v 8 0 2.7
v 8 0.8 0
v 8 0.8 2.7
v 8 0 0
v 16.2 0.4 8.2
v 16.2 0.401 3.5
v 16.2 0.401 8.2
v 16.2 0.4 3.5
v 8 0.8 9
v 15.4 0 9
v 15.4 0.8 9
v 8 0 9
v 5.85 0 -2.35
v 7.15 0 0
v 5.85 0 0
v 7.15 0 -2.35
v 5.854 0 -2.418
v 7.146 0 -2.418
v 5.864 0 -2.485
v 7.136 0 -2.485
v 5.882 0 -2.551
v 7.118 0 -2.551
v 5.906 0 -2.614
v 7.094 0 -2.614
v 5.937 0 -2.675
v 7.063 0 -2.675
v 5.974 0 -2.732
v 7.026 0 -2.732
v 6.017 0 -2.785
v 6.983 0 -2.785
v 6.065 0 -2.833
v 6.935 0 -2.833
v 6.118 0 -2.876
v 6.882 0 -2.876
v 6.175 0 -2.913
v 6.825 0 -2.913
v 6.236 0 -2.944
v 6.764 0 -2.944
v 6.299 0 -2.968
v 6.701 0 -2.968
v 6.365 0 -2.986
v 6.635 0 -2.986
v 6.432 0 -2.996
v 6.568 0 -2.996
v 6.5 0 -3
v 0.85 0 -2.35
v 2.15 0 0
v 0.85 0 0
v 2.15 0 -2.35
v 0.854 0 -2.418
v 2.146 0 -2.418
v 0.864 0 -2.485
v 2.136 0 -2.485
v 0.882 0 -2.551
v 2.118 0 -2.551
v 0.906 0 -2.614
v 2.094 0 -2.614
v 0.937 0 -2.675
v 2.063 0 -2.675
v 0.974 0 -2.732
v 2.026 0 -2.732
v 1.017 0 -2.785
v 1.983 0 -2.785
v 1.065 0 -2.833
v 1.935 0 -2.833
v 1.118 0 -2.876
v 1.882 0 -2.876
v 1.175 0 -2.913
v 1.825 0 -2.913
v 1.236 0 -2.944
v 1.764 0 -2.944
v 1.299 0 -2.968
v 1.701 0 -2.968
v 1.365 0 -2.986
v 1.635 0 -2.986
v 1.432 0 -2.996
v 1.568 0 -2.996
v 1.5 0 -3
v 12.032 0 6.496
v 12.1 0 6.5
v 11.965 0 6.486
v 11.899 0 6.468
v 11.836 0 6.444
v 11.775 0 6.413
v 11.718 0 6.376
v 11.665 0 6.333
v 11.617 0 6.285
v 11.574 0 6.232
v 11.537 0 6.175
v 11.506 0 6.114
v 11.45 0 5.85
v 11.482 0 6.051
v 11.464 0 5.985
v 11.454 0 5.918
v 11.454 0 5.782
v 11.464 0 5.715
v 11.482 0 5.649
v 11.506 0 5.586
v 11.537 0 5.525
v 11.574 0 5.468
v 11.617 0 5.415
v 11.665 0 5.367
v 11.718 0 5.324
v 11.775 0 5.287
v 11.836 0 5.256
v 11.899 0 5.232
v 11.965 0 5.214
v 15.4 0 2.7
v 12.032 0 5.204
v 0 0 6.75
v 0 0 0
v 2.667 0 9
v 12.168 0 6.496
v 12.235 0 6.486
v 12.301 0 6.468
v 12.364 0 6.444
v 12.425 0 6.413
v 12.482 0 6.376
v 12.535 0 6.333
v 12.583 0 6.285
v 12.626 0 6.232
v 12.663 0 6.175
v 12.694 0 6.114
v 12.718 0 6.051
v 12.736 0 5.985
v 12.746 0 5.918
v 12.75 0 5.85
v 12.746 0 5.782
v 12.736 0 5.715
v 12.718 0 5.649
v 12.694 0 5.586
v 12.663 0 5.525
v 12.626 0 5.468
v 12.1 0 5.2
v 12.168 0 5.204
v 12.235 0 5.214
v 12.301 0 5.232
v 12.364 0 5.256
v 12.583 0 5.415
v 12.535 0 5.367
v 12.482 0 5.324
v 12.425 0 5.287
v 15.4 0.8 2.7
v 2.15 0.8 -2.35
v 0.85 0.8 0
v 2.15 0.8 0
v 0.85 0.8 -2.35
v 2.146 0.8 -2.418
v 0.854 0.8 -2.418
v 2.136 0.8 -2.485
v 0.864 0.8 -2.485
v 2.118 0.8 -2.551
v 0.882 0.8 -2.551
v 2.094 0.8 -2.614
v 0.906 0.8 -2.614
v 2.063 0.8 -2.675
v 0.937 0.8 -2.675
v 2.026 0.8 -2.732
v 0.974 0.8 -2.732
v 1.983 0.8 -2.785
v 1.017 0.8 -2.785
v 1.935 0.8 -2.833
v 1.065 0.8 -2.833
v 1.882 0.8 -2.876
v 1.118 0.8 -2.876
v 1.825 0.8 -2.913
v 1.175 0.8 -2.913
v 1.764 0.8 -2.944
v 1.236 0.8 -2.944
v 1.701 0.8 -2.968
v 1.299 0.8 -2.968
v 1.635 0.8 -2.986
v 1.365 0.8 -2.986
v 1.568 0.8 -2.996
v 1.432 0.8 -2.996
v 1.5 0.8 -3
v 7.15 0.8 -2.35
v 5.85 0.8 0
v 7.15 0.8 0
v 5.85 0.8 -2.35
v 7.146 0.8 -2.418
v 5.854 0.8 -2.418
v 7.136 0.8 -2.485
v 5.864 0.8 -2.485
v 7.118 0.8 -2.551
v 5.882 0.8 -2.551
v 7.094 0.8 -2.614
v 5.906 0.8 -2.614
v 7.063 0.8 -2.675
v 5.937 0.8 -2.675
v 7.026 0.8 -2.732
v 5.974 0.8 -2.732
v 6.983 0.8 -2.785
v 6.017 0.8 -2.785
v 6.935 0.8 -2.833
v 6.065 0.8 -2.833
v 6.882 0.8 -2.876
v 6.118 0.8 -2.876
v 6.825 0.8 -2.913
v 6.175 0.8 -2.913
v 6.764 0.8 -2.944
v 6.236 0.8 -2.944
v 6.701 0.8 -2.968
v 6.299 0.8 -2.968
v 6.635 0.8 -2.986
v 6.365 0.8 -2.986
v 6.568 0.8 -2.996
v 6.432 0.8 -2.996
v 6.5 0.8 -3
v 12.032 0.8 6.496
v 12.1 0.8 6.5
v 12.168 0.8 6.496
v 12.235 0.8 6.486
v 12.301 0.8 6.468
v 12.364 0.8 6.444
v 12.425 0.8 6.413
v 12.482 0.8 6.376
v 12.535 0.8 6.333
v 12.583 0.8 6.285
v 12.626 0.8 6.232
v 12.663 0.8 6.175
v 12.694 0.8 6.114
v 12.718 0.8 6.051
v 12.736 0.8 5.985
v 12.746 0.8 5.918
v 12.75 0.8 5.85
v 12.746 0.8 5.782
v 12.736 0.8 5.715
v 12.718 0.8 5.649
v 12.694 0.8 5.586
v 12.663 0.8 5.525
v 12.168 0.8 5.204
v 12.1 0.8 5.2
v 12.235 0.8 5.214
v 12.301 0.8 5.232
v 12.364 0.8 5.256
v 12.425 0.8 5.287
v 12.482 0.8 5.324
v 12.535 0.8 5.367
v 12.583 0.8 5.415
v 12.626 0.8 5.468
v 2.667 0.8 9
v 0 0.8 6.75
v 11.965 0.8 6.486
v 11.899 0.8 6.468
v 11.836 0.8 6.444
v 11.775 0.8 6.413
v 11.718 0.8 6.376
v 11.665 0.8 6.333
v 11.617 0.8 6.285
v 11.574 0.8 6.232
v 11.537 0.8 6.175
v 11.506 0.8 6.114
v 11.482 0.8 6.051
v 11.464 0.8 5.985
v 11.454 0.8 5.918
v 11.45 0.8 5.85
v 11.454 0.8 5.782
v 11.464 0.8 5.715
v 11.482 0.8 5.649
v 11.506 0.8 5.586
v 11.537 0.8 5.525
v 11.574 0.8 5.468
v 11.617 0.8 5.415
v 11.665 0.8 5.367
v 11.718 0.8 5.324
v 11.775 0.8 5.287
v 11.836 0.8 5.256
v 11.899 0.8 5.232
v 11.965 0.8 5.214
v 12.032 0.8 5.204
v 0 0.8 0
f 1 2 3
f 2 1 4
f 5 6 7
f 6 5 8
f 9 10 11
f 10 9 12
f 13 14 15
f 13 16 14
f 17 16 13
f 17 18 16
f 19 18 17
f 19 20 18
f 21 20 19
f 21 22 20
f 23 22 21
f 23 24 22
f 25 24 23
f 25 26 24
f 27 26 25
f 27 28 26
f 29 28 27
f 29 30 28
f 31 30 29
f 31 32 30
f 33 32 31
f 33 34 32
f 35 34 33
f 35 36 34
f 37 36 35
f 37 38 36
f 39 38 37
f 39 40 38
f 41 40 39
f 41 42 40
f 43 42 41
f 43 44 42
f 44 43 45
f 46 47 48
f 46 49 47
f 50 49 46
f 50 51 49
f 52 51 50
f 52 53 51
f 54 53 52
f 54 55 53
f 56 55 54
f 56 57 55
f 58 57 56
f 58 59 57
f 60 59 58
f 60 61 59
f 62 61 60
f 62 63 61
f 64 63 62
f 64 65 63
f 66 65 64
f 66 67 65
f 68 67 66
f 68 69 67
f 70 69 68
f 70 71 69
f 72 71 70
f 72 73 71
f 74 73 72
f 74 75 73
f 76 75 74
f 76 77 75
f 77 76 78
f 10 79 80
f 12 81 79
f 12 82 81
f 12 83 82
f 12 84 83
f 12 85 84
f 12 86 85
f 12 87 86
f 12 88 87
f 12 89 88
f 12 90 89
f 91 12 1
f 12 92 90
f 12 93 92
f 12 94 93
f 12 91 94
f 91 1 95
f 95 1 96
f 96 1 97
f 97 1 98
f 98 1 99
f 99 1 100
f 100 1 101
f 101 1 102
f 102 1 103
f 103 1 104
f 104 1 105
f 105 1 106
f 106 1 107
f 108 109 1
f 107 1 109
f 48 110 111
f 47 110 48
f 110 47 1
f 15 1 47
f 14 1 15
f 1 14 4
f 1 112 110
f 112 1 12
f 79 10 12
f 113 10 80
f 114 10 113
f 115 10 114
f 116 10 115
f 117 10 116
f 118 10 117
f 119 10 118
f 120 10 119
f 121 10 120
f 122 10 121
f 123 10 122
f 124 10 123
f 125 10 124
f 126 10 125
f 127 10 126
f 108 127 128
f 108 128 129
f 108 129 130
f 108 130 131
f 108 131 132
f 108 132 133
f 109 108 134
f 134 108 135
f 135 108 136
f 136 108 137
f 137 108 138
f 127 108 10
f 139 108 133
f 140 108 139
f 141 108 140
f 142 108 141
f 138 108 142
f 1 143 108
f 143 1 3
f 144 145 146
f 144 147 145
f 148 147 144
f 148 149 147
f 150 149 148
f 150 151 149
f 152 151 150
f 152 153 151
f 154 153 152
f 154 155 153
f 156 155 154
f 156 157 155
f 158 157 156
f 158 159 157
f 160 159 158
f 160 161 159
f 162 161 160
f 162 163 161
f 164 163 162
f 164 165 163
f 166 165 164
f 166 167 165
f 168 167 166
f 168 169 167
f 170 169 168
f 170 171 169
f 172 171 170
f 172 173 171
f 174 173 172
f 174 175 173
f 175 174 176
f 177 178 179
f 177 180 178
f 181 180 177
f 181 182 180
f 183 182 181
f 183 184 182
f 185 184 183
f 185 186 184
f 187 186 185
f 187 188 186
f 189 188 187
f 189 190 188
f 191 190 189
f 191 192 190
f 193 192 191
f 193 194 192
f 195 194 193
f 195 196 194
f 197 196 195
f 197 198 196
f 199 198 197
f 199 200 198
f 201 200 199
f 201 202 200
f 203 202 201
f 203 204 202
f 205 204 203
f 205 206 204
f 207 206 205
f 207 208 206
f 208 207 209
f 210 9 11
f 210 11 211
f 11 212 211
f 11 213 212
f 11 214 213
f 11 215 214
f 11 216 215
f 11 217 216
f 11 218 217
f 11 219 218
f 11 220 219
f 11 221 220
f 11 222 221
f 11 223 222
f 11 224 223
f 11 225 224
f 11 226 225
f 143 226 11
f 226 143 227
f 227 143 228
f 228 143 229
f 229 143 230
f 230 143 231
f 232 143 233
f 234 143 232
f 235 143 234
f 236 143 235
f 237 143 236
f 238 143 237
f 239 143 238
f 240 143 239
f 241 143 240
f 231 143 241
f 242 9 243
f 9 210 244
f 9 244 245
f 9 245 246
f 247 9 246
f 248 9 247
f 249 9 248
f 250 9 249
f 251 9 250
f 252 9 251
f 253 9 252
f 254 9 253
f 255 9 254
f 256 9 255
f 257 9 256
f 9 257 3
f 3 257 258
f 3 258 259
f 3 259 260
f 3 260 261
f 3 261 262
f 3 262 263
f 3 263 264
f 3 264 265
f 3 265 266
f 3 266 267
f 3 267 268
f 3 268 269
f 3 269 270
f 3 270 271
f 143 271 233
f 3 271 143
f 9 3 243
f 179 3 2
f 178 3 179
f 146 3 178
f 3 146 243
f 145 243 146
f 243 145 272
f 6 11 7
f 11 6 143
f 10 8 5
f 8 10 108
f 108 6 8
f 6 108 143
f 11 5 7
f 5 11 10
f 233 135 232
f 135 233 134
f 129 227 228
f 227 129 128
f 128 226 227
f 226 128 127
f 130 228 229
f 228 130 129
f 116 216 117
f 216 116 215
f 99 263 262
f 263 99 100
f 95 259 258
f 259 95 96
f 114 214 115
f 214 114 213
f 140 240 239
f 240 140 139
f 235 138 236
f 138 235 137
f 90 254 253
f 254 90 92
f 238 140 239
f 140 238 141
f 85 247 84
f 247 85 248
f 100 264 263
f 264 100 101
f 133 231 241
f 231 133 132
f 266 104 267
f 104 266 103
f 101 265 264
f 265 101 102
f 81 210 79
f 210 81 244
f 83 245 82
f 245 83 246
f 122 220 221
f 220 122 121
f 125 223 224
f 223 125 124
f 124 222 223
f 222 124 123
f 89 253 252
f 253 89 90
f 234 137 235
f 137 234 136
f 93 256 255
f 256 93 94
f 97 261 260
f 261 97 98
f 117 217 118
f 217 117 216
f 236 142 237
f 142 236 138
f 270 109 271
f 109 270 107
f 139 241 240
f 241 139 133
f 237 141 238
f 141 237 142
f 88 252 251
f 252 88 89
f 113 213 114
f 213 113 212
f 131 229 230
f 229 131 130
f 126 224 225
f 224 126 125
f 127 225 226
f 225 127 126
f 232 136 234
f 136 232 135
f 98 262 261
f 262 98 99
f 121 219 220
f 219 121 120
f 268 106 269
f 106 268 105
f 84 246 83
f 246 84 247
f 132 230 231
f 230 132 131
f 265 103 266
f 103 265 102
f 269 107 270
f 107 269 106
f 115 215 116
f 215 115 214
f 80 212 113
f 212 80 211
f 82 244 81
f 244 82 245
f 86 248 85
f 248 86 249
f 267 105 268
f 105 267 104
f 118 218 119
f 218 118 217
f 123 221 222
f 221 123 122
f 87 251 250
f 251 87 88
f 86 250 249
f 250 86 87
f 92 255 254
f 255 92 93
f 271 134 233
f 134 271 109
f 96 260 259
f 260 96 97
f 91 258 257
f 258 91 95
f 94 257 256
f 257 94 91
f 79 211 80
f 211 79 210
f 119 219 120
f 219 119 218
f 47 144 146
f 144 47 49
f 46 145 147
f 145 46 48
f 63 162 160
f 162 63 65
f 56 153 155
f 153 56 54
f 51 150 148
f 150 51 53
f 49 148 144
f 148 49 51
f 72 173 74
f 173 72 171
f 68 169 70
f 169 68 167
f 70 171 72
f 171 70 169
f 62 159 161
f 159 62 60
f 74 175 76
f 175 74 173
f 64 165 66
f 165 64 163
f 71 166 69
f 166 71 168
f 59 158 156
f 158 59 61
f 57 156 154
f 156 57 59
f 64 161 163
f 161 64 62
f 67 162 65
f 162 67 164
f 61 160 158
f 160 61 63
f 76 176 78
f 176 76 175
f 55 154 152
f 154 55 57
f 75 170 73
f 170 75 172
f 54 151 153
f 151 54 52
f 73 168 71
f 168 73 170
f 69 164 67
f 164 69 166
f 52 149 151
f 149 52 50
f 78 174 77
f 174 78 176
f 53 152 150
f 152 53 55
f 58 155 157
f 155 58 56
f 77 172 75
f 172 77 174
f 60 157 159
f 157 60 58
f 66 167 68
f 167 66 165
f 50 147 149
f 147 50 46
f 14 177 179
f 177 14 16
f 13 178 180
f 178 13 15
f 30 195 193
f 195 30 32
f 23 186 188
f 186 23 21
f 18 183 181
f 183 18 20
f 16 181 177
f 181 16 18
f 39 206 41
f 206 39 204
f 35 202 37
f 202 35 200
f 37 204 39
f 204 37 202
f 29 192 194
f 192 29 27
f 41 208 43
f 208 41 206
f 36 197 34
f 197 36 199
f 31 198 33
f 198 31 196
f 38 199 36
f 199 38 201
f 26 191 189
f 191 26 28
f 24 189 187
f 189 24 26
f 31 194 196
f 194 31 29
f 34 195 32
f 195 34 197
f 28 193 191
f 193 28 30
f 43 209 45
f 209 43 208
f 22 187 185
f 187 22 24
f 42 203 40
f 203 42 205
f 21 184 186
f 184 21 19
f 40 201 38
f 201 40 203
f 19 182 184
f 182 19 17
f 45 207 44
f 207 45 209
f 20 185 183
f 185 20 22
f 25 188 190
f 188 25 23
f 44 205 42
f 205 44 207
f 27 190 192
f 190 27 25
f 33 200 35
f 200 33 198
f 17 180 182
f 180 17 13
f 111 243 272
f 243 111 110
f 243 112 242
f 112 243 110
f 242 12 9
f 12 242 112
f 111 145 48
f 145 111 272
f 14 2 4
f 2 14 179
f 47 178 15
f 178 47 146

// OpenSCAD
$fn=60;

T=3;
H=12;
A=5;
B1=8;
L=8.2;
D=1.65;
B=1.3;
S=0.8;
Thruhole=1.3;

hull() {
	cube([
		B1,
		S,
		(H-T)/4*3
	]);
	translate([
		B1/3,
		0,
		0
	]) cube([
		B1/3*2,
		S,
		H-T
	]);
}
	
translate([
	B1,
	0,
	H-T-6.3
]) difference() {
	hull() {
		cube([
			L-S,
			S,
			6.3
		]);
		translate([
			L-S,
			S/2,
			S
		]) cube([
			S,
			.001,
			6.3-2*S
		]);
	}
	translate([
		L/2,
		-.1,
		6.3/2
	]) rotate([-90,0,0]) cylinder(d=Thruhole, h=S+.2);
}

translate([
	B1/2 - A/2,
	0,
	-T+B/2
]) {
	translate([-B/2, 0, 0]) cube([B,S,T]);
	rotate([-90,0,0]) cylinder(d=B, h=S);
}


translate([
	B1/2 + A/2,
	0,
	-T+B/2
]) {
	translate([-B/2, 0, 0]) cube([B,S,T]);
	rotate([-90,0,0]) cylinder(d=B, h=S);
}
	
